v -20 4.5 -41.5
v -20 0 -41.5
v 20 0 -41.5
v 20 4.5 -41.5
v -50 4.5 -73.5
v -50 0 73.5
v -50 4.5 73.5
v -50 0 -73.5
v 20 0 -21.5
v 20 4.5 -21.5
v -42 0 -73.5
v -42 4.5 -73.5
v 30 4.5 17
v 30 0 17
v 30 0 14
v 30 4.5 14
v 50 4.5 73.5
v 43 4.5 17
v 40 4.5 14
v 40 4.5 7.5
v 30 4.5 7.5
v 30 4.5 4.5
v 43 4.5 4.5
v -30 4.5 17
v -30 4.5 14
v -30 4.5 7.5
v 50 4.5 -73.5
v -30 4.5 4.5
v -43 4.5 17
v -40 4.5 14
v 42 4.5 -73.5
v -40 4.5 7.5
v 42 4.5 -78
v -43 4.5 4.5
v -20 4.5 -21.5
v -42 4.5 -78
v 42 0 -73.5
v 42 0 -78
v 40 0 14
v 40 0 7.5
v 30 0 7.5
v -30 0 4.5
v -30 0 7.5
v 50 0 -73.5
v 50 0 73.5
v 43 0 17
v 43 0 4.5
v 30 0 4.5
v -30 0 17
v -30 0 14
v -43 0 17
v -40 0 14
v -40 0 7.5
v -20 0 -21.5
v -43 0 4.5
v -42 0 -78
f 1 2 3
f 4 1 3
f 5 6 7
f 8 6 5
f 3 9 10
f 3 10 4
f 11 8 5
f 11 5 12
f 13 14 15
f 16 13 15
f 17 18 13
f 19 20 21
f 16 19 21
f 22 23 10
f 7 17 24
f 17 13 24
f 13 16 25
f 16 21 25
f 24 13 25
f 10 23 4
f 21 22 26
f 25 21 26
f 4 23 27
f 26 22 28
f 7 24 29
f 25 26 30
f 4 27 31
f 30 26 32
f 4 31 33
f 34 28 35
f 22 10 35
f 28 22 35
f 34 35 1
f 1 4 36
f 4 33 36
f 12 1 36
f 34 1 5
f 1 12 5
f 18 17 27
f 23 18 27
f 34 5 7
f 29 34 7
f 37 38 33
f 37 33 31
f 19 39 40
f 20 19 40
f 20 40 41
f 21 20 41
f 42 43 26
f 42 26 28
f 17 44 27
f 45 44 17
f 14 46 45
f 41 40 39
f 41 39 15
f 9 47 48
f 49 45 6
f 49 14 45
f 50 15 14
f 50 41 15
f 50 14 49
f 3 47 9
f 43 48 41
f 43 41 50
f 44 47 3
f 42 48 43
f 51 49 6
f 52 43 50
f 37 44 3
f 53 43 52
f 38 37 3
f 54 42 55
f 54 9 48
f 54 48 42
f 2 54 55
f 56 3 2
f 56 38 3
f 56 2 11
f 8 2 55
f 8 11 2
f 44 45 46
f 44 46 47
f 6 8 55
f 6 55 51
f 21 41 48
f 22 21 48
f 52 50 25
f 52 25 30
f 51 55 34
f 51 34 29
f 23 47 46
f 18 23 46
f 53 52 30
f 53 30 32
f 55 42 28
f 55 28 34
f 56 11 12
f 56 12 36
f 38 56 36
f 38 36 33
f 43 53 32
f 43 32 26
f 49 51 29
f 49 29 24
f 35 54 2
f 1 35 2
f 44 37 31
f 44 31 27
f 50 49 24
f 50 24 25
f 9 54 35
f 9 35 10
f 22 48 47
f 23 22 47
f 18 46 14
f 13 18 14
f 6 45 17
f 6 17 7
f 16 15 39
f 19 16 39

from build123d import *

# Parameters (mm, degrees)
SKETCH2_W           = 40
SKETCH2_H           = 20
BOSS_EXTRUDE1_DEPTH = 4.5


with BuildPart() as part:
    # Sketch2 → Boss-Extrude1 (new body)
    with BuildSketch(Plane(origin=(0, 0, 0), x_dir=(1, 0, 0), z_dir=(0, 1, 0))):
        Polygon((-42, 73.5), (-42, 78), (42, 78), (42, 73.5), (50, 73.5), (50, -73.5), (-50, -73.5), (-50, 73.5), align=None)
        Polygon((-43, -4.5), (-43, -17), (-30, -17), (-30, -14), (-40, -14), (-40, -7.5), (-30, -7.5), (-30, -4.5), align=None, mode=Mode.SUBTRACT)
        Polygon((30, -17), (30, -14), (40, -14), (40, -7.5), (30, -7.5), (30, -4.5), (43, -4.5), (43, -17), align=None, mode=Mode.SUBTRACT)
        with Locations((0, 31.5)):
            Rectangle(SKETCH2_W, SKETCH2_H, mode=Mode.SUBTRACT)
    extrude(amount=BOSS_EXTRUDE1_DEPTH)


solid = part.part
